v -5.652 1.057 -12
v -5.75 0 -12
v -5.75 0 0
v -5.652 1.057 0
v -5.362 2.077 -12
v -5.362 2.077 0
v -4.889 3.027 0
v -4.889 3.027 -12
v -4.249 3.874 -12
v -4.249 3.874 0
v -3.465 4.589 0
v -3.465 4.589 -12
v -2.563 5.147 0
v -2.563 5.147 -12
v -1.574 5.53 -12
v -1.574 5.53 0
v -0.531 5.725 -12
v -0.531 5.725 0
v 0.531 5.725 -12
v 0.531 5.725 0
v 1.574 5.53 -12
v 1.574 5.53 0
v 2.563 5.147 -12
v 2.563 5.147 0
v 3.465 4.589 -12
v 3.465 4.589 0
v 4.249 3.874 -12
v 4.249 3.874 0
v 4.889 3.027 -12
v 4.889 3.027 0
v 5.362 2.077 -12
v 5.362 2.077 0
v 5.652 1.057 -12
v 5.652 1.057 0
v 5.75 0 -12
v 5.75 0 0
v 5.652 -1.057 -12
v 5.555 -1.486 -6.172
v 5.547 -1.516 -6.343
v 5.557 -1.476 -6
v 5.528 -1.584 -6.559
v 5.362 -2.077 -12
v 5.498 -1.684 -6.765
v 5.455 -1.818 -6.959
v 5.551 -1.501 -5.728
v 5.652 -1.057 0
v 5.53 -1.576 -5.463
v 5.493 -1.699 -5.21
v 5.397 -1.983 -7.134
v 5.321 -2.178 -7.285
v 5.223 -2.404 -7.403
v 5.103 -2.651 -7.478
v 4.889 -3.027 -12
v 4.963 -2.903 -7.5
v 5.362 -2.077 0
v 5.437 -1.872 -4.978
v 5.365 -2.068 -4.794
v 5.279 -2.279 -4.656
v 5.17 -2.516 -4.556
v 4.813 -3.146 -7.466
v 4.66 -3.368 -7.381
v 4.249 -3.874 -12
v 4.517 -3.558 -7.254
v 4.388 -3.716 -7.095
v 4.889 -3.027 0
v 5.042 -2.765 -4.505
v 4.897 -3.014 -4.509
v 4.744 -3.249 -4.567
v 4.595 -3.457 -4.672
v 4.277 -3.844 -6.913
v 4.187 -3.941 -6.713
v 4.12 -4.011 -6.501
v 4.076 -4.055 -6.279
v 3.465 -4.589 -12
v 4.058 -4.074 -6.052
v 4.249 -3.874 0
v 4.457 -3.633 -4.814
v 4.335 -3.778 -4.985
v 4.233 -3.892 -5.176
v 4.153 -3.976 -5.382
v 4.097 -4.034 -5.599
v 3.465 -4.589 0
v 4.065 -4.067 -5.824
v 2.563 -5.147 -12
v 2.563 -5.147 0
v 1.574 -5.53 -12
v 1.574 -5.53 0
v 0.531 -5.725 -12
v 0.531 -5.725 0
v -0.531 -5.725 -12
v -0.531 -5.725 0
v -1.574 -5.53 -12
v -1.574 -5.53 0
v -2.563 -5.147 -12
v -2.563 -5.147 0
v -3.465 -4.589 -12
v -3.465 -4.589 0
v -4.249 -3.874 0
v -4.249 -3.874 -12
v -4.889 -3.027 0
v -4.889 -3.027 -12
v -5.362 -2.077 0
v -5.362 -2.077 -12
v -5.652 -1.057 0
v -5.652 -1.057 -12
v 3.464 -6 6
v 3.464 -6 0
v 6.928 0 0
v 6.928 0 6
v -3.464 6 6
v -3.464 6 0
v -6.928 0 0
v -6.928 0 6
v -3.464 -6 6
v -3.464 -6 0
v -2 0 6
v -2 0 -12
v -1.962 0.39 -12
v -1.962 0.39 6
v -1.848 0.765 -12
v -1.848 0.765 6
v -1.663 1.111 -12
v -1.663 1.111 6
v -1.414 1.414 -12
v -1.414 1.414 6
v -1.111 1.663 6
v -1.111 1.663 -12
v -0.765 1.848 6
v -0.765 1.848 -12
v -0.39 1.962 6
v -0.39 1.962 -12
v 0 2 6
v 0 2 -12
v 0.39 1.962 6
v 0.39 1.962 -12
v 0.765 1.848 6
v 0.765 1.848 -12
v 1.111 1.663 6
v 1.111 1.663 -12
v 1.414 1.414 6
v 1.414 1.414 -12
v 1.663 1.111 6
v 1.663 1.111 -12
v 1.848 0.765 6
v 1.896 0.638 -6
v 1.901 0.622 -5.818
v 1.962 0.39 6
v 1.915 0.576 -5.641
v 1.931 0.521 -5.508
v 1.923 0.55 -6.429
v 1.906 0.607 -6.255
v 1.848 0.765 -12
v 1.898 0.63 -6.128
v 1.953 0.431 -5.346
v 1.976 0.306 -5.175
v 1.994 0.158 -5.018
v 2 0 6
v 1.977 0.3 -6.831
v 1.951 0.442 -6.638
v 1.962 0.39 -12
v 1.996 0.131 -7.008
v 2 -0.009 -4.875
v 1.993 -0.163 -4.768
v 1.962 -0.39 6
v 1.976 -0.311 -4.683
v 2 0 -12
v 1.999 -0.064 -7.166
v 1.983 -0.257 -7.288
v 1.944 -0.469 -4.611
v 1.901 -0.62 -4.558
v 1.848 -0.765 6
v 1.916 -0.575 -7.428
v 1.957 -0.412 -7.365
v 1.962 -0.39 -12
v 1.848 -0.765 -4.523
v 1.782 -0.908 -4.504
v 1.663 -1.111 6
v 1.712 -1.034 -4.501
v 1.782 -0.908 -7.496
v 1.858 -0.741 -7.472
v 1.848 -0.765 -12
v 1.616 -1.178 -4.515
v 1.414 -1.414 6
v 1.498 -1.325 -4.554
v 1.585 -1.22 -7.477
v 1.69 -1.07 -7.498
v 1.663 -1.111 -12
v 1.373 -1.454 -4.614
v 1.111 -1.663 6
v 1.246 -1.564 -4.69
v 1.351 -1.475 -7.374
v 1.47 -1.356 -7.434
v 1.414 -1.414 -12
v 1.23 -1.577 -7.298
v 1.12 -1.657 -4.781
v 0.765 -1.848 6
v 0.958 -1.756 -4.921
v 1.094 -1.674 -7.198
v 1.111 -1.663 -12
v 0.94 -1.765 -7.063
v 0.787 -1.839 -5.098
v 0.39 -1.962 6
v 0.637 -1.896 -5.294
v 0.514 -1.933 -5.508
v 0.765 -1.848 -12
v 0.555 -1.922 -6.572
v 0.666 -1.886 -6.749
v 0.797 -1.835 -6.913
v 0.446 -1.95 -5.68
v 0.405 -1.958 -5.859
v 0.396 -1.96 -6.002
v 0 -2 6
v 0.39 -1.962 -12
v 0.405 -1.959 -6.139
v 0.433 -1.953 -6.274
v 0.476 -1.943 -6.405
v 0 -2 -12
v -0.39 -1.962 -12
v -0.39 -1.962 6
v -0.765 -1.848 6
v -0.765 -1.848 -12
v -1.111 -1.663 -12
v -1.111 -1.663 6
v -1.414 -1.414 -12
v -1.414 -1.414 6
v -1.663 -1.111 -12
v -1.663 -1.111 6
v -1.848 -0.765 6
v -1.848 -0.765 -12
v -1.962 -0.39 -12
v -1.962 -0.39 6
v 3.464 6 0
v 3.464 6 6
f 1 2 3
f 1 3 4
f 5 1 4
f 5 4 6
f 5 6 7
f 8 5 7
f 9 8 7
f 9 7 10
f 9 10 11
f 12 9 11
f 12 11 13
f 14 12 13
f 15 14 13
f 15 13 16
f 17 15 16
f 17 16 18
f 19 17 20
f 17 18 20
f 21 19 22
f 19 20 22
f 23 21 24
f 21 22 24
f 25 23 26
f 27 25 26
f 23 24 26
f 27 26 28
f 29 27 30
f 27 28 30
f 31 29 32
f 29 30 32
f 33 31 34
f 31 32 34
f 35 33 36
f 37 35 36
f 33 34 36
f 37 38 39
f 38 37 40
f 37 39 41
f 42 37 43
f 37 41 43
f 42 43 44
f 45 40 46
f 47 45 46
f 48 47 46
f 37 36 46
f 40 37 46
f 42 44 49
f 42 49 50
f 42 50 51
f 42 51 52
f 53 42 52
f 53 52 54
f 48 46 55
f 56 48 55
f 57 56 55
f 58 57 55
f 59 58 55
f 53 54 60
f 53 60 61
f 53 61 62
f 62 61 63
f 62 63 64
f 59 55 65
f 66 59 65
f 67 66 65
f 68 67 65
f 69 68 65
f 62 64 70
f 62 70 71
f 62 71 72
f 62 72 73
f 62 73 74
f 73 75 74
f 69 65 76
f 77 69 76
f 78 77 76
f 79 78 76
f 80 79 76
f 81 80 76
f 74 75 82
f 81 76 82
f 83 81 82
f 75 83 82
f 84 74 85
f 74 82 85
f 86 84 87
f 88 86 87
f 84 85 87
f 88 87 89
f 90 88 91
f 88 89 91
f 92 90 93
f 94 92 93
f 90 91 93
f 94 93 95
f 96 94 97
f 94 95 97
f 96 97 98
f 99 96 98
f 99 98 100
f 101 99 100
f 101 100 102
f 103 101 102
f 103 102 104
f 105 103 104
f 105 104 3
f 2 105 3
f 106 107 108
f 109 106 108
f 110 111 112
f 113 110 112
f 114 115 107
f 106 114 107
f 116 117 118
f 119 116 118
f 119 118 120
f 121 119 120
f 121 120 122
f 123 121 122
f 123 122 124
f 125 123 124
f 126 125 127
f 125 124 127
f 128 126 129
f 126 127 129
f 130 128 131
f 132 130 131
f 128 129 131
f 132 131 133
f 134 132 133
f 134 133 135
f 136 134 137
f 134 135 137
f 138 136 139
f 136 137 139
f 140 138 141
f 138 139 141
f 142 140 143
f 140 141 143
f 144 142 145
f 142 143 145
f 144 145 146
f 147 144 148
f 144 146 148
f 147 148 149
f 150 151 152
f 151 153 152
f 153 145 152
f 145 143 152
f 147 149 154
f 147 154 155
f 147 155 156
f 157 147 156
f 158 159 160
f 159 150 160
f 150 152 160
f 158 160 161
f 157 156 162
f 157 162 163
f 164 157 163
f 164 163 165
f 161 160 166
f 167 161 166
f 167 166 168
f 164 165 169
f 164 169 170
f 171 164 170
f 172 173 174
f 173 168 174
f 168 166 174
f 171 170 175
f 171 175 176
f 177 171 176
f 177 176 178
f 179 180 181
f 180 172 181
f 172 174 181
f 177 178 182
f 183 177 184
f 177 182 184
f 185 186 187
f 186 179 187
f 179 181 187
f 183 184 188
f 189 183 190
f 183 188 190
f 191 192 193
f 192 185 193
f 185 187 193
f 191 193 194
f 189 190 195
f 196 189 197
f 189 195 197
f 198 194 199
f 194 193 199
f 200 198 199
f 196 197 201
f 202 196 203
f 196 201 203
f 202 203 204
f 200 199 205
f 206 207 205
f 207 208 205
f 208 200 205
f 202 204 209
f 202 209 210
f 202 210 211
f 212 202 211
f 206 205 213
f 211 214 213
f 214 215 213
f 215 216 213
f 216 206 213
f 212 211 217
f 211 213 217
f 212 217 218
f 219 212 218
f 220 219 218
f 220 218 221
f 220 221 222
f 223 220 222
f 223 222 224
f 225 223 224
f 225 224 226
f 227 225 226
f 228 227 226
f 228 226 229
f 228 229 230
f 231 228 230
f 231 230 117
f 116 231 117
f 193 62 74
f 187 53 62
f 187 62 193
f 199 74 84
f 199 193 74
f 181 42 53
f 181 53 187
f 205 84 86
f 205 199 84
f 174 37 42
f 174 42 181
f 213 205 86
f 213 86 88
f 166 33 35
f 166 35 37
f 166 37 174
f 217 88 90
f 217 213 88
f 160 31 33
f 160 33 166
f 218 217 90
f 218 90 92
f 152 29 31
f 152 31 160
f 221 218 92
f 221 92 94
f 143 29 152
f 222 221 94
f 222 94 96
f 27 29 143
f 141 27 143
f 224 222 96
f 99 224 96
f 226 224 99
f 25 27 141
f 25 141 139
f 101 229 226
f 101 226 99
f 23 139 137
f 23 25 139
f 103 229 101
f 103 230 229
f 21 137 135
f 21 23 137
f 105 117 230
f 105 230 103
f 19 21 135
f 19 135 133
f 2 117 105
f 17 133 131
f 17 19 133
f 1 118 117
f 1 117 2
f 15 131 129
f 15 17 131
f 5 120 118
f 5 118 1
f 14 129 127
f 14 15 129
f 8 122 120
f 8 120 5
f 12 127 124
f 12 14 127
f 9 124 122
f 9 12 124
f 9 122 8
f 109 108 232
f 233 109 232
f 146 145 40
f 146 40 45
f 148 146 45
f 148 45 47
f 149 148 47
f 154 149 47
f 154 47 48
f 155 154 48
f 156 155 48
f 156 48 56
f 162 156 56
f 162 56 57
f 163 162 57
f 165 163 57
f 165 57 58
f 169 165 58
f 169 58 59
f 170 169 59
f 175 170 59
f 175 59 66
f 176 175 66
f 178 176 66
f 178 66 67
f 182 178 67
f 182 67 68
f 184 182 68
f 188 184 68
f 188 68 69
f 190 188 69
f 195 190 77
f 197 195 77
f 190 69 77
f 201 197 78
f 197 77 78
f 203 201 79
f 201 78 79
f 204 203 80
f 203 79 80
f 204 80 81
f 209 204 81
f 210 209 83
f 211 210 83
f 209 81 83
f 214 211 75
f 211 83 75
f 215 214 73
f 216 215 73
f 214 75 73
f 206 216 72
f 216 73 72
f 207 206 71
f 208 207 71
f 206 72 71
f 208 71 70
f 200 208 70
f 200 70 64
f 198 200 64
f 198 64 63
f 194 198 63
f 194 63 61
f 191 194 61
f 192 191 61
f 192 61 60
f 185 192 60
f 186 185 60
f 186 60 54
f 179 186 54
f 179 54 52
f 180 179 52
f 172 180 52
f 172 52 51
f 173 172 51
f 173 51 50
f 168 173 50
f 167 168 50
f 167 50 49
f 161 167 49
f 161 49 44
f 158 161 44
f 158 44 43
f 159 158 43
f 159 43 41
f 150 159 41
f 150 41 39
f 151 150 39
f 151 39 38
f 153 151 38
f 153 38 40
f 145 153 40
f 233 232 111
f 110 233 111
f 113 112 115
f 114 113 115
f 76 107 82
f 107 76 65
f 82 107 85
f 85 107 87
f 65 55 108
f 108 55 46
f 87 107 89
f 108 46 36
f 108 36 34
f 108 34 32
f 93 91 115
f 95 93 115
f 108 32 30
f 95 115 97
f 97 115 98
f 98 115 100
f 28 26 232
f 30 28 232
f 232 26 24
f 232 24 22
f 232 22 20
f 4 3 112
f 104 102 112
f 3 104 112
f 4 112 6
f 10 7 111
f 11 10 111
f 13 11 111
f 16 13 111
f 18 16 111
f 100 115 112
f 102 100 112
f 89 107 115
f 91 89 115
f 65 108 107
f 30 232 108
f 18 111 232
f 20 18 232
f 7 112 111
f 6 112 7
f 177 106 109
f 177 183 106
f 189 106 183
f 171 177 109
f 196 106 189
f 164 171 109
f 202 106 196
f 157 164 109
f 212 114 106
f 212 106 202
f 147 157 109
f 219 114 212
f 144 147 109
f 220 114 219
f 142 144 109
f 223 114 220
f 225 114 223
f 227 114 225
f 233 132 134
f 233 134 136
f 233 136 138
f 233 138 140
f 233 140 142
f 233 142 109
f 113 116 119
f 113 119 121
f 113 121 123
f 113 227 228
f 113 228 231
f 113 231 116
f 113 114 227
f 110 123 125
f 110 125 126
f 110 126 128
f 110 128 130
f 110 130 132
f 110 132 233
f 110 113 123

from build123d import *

# Parameters (mm, degrees)
BOSS_EXTRUDE1_DEPTH = 6
SKETCH2_R           = 5.75
BOSS_EXTRUDE2_DEPTH = 12
SKETCH4_R           = 2
CUT_EXTRUDE2_DEPTH  = 21.199009877
SKETCH5_R           = 1.5
CUT_EXTRUDE3_DEPTH  = 6


with BuildPart() as part:
    # Sketch1 → Boss-Extrude1 (new body)
    with BuildSketch(Plane(origin=(0, 0, 0), x_dir=(0, 1, 0), z_dir=(0, 0, 1))):
        Polygon((0, 6.92820323), (-6, 3.464101615), (-6, -3.464101615), (0, -6.92820323), (6, -3.464101615), (6, 3.464101615), align=None)
    extrude(amount=BOSS_EXTRUDE1_DEPTH)

    # Sketch2 → Boss-Extrude2 (add)
    with BuildSketch(Plane(origin=(0, 0, 0), x_dir=(1, 0, 0), z_dir=(0, 0, -1))):
        with Locations(Location((0, 0, 0), (0, 0, 180))):
            Circle(SKETCH2_R)
    extrude(amount=BOSS_EXTRUDE2_DEPTH)

    # Sketch4 → Cut-Extrude2 (cut, through all)
    with BuildSketch(Plane(origin=(0, 0, -12), x_dir=(1, 0, 0), z_dir=(0, 0, -1))):
        with Locations(Location((0, 0, 0), (0, 0, 180))):
            Circle(SKETCH4_R)
    extrude(amount=-CUT_EXTRUDE2_DEPTH, mode=Mode.SUBTRACT)

    # Sketch5 → Cut-Extrude3 (cut)
    with BuildSketch(Plane(origin=(5.196152423, -3, 0), x_dir=(0.49999999999999506, 0.8660254037844415, 0), z_dir=(0.8660254037844415, -0.49999999999999506, 0))):
        with Locations((0, -6)):
            Circle(SKETCH5_R)
    extrude(amount=-CUT_EXTRUDE3_DEPTH, mode=Mode.SUBTRACT)


solid = part.part
